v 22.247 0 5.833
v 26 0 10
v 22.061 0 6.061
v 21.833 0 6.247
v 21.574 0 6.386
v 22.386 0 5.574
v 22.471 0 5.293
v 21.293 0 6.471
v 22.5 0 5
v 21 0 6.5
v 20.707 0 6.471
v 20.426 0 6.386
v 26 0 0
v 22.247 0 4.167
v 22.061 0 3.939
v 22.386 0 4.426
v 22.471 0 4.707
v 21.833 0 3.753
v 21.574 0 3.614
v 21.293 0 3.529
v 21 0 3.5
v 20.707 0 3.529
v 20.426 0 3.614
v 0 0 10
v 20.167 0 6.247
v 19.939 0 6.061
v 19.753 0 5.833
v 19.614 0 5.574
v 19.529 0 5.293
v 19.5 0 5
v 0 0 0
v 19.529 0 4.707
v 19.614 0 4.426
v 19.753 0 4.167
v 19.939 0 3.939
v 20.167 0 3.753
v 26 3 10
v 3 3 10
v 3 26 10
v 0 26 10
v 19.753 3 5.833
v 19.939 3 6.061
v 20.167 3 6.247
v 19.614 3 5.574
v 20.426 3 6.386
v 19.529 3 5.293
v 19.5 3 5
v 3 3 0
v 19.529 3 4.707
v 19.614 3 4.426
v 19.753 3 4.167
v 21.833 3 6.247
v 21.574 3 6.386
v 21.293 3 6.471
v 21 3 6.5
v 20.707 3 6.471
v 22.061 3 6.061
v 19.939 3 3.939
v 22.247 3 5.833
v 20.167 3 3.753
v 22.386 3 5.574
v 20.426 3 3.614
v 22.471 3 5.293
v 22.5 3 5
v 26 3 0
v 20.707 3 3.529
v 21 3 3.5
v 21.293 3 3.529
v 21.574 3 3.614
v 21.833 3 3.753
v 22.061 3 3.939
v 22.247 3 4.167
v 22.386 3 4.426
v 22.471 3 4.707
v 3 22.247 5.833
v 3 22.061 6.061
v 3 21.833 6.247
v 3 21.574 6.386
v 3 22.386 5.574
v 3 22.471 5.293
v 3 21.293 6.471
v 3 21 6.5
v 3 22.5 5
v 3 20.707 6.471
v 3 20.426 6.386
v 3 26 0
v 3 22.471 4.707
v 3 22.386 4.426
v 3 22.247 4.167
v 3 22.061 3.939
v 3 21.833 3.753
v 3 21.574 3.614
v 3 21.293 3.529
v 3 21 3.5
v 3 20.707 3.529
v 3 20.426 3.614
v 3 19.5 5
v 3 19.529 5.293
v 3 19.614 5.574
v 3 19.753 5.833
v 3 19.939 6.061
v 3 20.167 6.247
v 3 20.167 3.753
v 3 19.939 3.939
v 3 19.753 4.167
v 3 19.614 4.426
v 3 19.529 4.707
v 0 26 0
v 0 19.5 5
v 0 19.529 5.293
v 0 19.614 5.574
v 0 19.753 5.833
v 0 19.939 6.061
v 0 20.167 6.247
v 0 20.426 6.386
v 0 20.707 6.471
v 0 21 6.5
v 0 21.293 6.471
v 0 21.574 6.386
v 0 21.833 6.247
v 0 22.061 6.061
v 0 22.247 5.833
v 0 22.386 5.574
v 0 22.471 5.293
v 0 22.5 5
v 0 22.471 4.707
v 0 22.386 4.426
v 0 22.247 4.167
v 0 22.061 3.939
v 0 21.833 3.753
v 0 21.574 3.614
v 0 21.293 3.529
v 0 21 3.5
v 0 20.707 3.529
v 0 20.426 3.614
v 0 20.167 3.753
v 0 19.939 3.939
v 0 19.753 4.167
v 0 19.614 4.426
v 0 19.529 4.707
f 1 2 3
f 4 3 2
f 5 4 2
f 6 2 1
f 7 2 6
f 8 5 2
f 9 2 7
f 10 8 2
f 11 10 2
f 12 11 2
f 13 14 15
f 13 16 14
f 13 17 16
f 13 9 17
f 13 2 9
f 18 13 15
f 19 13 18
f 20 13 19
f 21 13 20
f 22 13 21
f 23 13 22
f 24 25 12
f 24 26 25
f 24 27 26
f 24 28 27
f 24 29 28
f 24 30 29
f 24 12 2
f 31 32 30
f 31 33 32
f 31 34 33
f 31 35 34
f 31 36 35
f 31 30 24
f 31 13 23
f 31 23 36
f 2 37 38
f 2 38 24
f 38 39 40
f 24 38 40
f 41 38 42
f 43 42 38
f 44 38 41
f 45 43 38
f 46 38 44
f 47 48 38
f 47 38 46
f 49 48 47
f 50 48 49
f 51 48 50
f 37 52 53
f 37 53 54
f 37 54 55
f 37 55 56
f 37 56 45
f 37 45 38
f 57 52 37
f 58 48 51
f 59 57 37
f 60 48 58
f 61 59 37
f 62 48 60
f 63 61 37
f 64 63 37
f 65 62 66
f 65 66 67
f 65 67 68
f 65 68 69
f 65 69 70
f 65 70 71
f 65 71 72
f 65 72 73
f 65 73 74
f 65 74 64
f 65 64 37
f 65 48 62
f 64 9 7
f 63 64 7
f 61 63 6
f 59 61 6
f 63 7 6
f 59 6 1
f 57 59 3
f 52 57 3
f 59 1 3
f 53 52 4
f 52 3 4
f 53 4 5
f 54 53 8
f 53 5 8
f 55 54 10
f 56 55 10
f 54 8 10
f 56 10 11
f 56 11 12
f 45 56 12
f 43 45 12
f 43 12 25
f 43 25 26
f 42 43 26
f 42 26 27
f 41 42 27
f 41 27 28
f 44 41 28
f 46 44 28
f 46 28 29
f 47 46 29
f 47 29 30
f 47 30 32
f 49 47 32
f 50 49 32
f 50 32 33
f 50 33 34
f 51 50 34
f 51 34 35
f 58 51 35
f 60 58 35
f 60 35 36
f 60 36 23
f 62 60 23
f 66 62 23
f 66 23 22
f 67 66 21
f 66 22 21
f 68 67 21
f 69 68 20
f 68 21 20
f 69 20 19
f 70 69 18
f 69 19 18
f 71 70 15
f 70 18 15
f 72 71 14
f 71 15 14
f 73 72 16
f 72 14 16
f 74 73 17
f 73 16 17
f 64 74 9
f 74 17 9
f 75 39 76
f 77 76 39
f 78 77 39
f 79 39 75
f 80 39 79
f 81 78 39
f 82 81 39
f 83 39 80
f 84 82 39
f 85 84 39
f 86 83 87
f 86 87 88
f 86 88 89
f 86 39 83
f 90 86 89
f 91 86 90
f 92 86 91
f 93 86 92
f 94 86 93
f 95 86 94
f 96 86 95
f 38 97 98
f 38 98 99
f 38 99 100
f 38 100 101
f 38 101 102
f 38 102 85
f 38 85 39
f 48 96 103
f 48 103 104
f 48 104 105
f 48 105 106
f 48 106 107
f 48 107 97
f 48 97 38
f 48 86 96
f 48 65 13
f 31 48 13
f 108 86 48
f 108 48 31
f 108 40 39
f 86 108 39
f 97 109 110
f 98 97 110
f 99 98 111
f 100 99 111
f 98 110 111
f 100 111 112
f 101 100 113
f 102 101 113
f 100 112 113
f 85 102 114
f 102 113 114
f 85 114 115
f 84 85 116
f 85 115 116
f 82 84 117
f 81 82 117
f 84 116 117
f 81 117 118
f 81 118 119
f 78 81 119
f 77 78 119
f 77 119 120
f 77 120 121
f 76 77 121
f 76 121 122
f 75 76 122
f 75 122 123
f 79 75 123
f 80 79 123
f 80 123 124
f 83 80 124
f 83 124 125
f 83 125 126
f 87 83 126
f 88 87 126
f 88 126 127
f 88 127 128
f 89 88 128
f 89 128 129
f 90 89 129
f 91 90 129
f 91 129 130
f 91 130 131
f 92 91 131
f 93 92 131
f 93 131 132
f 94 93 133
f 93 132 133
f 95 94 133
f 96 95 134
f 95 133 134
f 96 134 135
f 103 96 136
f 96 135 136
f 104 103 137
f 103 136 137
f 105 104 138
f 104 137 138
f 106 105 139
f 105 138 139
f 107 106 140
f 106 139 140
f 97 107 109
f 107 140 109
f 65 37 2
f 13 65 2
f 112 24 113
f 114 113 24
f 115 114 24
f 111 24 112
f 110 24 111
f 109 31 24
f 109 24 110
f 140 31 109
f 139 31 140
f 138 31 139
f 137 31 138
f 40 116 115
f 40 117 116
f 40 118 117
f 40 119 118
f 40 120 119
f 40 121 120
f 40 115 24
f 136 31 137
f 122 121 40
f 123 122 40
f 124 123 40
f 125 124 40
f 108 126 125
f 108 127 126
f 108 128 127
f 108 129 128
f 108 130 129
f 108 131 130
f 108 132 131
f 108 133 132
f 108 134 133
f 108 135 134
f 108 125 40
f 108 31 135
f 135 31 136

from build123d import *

# Parameters (mm, degrees)
PAD_DEPTH       = 10
SKETCH001_R     = 1.5
POCKET_DEPTH    = 5
SKETCH002_R     = 1.5
POCKET001_DEPTH = 5


with BuildPart() as part:
    # Sketch → Pad (new body)
    with BuildSketch(Plane.XY):
        Polygon((0, 0), (0, 26), (3, 26), (3, 3), (26, 3), (26, 0), align=None)
    extrude(amount=PAD_DEPTH)

    # Sketch001 (on Face6 of Pad) → Pocket (cut)
    with BuildSketch(Plane.XZ):
        with Locations((21, 5)):
            Circle(SKETCH001_R)
    extrude(amount=-POCKET_DEPTH, mode=Mode.SUBTRACT)

    # Sketch002 (on Face1 of Pocket) → Pocket001 (cut)
    with BuildSketch(Plane(origin=(0, 0, 0), x_dir=(0, -1, 0), z_dir=(-1, 0, 0))):
        with Locations((-21, 5)):
            Circle(SKETCH002_R)
    extrude(amount=-POCKET001_DEPTH, mode=Mode.SUBTRACT)


solid = part.part
